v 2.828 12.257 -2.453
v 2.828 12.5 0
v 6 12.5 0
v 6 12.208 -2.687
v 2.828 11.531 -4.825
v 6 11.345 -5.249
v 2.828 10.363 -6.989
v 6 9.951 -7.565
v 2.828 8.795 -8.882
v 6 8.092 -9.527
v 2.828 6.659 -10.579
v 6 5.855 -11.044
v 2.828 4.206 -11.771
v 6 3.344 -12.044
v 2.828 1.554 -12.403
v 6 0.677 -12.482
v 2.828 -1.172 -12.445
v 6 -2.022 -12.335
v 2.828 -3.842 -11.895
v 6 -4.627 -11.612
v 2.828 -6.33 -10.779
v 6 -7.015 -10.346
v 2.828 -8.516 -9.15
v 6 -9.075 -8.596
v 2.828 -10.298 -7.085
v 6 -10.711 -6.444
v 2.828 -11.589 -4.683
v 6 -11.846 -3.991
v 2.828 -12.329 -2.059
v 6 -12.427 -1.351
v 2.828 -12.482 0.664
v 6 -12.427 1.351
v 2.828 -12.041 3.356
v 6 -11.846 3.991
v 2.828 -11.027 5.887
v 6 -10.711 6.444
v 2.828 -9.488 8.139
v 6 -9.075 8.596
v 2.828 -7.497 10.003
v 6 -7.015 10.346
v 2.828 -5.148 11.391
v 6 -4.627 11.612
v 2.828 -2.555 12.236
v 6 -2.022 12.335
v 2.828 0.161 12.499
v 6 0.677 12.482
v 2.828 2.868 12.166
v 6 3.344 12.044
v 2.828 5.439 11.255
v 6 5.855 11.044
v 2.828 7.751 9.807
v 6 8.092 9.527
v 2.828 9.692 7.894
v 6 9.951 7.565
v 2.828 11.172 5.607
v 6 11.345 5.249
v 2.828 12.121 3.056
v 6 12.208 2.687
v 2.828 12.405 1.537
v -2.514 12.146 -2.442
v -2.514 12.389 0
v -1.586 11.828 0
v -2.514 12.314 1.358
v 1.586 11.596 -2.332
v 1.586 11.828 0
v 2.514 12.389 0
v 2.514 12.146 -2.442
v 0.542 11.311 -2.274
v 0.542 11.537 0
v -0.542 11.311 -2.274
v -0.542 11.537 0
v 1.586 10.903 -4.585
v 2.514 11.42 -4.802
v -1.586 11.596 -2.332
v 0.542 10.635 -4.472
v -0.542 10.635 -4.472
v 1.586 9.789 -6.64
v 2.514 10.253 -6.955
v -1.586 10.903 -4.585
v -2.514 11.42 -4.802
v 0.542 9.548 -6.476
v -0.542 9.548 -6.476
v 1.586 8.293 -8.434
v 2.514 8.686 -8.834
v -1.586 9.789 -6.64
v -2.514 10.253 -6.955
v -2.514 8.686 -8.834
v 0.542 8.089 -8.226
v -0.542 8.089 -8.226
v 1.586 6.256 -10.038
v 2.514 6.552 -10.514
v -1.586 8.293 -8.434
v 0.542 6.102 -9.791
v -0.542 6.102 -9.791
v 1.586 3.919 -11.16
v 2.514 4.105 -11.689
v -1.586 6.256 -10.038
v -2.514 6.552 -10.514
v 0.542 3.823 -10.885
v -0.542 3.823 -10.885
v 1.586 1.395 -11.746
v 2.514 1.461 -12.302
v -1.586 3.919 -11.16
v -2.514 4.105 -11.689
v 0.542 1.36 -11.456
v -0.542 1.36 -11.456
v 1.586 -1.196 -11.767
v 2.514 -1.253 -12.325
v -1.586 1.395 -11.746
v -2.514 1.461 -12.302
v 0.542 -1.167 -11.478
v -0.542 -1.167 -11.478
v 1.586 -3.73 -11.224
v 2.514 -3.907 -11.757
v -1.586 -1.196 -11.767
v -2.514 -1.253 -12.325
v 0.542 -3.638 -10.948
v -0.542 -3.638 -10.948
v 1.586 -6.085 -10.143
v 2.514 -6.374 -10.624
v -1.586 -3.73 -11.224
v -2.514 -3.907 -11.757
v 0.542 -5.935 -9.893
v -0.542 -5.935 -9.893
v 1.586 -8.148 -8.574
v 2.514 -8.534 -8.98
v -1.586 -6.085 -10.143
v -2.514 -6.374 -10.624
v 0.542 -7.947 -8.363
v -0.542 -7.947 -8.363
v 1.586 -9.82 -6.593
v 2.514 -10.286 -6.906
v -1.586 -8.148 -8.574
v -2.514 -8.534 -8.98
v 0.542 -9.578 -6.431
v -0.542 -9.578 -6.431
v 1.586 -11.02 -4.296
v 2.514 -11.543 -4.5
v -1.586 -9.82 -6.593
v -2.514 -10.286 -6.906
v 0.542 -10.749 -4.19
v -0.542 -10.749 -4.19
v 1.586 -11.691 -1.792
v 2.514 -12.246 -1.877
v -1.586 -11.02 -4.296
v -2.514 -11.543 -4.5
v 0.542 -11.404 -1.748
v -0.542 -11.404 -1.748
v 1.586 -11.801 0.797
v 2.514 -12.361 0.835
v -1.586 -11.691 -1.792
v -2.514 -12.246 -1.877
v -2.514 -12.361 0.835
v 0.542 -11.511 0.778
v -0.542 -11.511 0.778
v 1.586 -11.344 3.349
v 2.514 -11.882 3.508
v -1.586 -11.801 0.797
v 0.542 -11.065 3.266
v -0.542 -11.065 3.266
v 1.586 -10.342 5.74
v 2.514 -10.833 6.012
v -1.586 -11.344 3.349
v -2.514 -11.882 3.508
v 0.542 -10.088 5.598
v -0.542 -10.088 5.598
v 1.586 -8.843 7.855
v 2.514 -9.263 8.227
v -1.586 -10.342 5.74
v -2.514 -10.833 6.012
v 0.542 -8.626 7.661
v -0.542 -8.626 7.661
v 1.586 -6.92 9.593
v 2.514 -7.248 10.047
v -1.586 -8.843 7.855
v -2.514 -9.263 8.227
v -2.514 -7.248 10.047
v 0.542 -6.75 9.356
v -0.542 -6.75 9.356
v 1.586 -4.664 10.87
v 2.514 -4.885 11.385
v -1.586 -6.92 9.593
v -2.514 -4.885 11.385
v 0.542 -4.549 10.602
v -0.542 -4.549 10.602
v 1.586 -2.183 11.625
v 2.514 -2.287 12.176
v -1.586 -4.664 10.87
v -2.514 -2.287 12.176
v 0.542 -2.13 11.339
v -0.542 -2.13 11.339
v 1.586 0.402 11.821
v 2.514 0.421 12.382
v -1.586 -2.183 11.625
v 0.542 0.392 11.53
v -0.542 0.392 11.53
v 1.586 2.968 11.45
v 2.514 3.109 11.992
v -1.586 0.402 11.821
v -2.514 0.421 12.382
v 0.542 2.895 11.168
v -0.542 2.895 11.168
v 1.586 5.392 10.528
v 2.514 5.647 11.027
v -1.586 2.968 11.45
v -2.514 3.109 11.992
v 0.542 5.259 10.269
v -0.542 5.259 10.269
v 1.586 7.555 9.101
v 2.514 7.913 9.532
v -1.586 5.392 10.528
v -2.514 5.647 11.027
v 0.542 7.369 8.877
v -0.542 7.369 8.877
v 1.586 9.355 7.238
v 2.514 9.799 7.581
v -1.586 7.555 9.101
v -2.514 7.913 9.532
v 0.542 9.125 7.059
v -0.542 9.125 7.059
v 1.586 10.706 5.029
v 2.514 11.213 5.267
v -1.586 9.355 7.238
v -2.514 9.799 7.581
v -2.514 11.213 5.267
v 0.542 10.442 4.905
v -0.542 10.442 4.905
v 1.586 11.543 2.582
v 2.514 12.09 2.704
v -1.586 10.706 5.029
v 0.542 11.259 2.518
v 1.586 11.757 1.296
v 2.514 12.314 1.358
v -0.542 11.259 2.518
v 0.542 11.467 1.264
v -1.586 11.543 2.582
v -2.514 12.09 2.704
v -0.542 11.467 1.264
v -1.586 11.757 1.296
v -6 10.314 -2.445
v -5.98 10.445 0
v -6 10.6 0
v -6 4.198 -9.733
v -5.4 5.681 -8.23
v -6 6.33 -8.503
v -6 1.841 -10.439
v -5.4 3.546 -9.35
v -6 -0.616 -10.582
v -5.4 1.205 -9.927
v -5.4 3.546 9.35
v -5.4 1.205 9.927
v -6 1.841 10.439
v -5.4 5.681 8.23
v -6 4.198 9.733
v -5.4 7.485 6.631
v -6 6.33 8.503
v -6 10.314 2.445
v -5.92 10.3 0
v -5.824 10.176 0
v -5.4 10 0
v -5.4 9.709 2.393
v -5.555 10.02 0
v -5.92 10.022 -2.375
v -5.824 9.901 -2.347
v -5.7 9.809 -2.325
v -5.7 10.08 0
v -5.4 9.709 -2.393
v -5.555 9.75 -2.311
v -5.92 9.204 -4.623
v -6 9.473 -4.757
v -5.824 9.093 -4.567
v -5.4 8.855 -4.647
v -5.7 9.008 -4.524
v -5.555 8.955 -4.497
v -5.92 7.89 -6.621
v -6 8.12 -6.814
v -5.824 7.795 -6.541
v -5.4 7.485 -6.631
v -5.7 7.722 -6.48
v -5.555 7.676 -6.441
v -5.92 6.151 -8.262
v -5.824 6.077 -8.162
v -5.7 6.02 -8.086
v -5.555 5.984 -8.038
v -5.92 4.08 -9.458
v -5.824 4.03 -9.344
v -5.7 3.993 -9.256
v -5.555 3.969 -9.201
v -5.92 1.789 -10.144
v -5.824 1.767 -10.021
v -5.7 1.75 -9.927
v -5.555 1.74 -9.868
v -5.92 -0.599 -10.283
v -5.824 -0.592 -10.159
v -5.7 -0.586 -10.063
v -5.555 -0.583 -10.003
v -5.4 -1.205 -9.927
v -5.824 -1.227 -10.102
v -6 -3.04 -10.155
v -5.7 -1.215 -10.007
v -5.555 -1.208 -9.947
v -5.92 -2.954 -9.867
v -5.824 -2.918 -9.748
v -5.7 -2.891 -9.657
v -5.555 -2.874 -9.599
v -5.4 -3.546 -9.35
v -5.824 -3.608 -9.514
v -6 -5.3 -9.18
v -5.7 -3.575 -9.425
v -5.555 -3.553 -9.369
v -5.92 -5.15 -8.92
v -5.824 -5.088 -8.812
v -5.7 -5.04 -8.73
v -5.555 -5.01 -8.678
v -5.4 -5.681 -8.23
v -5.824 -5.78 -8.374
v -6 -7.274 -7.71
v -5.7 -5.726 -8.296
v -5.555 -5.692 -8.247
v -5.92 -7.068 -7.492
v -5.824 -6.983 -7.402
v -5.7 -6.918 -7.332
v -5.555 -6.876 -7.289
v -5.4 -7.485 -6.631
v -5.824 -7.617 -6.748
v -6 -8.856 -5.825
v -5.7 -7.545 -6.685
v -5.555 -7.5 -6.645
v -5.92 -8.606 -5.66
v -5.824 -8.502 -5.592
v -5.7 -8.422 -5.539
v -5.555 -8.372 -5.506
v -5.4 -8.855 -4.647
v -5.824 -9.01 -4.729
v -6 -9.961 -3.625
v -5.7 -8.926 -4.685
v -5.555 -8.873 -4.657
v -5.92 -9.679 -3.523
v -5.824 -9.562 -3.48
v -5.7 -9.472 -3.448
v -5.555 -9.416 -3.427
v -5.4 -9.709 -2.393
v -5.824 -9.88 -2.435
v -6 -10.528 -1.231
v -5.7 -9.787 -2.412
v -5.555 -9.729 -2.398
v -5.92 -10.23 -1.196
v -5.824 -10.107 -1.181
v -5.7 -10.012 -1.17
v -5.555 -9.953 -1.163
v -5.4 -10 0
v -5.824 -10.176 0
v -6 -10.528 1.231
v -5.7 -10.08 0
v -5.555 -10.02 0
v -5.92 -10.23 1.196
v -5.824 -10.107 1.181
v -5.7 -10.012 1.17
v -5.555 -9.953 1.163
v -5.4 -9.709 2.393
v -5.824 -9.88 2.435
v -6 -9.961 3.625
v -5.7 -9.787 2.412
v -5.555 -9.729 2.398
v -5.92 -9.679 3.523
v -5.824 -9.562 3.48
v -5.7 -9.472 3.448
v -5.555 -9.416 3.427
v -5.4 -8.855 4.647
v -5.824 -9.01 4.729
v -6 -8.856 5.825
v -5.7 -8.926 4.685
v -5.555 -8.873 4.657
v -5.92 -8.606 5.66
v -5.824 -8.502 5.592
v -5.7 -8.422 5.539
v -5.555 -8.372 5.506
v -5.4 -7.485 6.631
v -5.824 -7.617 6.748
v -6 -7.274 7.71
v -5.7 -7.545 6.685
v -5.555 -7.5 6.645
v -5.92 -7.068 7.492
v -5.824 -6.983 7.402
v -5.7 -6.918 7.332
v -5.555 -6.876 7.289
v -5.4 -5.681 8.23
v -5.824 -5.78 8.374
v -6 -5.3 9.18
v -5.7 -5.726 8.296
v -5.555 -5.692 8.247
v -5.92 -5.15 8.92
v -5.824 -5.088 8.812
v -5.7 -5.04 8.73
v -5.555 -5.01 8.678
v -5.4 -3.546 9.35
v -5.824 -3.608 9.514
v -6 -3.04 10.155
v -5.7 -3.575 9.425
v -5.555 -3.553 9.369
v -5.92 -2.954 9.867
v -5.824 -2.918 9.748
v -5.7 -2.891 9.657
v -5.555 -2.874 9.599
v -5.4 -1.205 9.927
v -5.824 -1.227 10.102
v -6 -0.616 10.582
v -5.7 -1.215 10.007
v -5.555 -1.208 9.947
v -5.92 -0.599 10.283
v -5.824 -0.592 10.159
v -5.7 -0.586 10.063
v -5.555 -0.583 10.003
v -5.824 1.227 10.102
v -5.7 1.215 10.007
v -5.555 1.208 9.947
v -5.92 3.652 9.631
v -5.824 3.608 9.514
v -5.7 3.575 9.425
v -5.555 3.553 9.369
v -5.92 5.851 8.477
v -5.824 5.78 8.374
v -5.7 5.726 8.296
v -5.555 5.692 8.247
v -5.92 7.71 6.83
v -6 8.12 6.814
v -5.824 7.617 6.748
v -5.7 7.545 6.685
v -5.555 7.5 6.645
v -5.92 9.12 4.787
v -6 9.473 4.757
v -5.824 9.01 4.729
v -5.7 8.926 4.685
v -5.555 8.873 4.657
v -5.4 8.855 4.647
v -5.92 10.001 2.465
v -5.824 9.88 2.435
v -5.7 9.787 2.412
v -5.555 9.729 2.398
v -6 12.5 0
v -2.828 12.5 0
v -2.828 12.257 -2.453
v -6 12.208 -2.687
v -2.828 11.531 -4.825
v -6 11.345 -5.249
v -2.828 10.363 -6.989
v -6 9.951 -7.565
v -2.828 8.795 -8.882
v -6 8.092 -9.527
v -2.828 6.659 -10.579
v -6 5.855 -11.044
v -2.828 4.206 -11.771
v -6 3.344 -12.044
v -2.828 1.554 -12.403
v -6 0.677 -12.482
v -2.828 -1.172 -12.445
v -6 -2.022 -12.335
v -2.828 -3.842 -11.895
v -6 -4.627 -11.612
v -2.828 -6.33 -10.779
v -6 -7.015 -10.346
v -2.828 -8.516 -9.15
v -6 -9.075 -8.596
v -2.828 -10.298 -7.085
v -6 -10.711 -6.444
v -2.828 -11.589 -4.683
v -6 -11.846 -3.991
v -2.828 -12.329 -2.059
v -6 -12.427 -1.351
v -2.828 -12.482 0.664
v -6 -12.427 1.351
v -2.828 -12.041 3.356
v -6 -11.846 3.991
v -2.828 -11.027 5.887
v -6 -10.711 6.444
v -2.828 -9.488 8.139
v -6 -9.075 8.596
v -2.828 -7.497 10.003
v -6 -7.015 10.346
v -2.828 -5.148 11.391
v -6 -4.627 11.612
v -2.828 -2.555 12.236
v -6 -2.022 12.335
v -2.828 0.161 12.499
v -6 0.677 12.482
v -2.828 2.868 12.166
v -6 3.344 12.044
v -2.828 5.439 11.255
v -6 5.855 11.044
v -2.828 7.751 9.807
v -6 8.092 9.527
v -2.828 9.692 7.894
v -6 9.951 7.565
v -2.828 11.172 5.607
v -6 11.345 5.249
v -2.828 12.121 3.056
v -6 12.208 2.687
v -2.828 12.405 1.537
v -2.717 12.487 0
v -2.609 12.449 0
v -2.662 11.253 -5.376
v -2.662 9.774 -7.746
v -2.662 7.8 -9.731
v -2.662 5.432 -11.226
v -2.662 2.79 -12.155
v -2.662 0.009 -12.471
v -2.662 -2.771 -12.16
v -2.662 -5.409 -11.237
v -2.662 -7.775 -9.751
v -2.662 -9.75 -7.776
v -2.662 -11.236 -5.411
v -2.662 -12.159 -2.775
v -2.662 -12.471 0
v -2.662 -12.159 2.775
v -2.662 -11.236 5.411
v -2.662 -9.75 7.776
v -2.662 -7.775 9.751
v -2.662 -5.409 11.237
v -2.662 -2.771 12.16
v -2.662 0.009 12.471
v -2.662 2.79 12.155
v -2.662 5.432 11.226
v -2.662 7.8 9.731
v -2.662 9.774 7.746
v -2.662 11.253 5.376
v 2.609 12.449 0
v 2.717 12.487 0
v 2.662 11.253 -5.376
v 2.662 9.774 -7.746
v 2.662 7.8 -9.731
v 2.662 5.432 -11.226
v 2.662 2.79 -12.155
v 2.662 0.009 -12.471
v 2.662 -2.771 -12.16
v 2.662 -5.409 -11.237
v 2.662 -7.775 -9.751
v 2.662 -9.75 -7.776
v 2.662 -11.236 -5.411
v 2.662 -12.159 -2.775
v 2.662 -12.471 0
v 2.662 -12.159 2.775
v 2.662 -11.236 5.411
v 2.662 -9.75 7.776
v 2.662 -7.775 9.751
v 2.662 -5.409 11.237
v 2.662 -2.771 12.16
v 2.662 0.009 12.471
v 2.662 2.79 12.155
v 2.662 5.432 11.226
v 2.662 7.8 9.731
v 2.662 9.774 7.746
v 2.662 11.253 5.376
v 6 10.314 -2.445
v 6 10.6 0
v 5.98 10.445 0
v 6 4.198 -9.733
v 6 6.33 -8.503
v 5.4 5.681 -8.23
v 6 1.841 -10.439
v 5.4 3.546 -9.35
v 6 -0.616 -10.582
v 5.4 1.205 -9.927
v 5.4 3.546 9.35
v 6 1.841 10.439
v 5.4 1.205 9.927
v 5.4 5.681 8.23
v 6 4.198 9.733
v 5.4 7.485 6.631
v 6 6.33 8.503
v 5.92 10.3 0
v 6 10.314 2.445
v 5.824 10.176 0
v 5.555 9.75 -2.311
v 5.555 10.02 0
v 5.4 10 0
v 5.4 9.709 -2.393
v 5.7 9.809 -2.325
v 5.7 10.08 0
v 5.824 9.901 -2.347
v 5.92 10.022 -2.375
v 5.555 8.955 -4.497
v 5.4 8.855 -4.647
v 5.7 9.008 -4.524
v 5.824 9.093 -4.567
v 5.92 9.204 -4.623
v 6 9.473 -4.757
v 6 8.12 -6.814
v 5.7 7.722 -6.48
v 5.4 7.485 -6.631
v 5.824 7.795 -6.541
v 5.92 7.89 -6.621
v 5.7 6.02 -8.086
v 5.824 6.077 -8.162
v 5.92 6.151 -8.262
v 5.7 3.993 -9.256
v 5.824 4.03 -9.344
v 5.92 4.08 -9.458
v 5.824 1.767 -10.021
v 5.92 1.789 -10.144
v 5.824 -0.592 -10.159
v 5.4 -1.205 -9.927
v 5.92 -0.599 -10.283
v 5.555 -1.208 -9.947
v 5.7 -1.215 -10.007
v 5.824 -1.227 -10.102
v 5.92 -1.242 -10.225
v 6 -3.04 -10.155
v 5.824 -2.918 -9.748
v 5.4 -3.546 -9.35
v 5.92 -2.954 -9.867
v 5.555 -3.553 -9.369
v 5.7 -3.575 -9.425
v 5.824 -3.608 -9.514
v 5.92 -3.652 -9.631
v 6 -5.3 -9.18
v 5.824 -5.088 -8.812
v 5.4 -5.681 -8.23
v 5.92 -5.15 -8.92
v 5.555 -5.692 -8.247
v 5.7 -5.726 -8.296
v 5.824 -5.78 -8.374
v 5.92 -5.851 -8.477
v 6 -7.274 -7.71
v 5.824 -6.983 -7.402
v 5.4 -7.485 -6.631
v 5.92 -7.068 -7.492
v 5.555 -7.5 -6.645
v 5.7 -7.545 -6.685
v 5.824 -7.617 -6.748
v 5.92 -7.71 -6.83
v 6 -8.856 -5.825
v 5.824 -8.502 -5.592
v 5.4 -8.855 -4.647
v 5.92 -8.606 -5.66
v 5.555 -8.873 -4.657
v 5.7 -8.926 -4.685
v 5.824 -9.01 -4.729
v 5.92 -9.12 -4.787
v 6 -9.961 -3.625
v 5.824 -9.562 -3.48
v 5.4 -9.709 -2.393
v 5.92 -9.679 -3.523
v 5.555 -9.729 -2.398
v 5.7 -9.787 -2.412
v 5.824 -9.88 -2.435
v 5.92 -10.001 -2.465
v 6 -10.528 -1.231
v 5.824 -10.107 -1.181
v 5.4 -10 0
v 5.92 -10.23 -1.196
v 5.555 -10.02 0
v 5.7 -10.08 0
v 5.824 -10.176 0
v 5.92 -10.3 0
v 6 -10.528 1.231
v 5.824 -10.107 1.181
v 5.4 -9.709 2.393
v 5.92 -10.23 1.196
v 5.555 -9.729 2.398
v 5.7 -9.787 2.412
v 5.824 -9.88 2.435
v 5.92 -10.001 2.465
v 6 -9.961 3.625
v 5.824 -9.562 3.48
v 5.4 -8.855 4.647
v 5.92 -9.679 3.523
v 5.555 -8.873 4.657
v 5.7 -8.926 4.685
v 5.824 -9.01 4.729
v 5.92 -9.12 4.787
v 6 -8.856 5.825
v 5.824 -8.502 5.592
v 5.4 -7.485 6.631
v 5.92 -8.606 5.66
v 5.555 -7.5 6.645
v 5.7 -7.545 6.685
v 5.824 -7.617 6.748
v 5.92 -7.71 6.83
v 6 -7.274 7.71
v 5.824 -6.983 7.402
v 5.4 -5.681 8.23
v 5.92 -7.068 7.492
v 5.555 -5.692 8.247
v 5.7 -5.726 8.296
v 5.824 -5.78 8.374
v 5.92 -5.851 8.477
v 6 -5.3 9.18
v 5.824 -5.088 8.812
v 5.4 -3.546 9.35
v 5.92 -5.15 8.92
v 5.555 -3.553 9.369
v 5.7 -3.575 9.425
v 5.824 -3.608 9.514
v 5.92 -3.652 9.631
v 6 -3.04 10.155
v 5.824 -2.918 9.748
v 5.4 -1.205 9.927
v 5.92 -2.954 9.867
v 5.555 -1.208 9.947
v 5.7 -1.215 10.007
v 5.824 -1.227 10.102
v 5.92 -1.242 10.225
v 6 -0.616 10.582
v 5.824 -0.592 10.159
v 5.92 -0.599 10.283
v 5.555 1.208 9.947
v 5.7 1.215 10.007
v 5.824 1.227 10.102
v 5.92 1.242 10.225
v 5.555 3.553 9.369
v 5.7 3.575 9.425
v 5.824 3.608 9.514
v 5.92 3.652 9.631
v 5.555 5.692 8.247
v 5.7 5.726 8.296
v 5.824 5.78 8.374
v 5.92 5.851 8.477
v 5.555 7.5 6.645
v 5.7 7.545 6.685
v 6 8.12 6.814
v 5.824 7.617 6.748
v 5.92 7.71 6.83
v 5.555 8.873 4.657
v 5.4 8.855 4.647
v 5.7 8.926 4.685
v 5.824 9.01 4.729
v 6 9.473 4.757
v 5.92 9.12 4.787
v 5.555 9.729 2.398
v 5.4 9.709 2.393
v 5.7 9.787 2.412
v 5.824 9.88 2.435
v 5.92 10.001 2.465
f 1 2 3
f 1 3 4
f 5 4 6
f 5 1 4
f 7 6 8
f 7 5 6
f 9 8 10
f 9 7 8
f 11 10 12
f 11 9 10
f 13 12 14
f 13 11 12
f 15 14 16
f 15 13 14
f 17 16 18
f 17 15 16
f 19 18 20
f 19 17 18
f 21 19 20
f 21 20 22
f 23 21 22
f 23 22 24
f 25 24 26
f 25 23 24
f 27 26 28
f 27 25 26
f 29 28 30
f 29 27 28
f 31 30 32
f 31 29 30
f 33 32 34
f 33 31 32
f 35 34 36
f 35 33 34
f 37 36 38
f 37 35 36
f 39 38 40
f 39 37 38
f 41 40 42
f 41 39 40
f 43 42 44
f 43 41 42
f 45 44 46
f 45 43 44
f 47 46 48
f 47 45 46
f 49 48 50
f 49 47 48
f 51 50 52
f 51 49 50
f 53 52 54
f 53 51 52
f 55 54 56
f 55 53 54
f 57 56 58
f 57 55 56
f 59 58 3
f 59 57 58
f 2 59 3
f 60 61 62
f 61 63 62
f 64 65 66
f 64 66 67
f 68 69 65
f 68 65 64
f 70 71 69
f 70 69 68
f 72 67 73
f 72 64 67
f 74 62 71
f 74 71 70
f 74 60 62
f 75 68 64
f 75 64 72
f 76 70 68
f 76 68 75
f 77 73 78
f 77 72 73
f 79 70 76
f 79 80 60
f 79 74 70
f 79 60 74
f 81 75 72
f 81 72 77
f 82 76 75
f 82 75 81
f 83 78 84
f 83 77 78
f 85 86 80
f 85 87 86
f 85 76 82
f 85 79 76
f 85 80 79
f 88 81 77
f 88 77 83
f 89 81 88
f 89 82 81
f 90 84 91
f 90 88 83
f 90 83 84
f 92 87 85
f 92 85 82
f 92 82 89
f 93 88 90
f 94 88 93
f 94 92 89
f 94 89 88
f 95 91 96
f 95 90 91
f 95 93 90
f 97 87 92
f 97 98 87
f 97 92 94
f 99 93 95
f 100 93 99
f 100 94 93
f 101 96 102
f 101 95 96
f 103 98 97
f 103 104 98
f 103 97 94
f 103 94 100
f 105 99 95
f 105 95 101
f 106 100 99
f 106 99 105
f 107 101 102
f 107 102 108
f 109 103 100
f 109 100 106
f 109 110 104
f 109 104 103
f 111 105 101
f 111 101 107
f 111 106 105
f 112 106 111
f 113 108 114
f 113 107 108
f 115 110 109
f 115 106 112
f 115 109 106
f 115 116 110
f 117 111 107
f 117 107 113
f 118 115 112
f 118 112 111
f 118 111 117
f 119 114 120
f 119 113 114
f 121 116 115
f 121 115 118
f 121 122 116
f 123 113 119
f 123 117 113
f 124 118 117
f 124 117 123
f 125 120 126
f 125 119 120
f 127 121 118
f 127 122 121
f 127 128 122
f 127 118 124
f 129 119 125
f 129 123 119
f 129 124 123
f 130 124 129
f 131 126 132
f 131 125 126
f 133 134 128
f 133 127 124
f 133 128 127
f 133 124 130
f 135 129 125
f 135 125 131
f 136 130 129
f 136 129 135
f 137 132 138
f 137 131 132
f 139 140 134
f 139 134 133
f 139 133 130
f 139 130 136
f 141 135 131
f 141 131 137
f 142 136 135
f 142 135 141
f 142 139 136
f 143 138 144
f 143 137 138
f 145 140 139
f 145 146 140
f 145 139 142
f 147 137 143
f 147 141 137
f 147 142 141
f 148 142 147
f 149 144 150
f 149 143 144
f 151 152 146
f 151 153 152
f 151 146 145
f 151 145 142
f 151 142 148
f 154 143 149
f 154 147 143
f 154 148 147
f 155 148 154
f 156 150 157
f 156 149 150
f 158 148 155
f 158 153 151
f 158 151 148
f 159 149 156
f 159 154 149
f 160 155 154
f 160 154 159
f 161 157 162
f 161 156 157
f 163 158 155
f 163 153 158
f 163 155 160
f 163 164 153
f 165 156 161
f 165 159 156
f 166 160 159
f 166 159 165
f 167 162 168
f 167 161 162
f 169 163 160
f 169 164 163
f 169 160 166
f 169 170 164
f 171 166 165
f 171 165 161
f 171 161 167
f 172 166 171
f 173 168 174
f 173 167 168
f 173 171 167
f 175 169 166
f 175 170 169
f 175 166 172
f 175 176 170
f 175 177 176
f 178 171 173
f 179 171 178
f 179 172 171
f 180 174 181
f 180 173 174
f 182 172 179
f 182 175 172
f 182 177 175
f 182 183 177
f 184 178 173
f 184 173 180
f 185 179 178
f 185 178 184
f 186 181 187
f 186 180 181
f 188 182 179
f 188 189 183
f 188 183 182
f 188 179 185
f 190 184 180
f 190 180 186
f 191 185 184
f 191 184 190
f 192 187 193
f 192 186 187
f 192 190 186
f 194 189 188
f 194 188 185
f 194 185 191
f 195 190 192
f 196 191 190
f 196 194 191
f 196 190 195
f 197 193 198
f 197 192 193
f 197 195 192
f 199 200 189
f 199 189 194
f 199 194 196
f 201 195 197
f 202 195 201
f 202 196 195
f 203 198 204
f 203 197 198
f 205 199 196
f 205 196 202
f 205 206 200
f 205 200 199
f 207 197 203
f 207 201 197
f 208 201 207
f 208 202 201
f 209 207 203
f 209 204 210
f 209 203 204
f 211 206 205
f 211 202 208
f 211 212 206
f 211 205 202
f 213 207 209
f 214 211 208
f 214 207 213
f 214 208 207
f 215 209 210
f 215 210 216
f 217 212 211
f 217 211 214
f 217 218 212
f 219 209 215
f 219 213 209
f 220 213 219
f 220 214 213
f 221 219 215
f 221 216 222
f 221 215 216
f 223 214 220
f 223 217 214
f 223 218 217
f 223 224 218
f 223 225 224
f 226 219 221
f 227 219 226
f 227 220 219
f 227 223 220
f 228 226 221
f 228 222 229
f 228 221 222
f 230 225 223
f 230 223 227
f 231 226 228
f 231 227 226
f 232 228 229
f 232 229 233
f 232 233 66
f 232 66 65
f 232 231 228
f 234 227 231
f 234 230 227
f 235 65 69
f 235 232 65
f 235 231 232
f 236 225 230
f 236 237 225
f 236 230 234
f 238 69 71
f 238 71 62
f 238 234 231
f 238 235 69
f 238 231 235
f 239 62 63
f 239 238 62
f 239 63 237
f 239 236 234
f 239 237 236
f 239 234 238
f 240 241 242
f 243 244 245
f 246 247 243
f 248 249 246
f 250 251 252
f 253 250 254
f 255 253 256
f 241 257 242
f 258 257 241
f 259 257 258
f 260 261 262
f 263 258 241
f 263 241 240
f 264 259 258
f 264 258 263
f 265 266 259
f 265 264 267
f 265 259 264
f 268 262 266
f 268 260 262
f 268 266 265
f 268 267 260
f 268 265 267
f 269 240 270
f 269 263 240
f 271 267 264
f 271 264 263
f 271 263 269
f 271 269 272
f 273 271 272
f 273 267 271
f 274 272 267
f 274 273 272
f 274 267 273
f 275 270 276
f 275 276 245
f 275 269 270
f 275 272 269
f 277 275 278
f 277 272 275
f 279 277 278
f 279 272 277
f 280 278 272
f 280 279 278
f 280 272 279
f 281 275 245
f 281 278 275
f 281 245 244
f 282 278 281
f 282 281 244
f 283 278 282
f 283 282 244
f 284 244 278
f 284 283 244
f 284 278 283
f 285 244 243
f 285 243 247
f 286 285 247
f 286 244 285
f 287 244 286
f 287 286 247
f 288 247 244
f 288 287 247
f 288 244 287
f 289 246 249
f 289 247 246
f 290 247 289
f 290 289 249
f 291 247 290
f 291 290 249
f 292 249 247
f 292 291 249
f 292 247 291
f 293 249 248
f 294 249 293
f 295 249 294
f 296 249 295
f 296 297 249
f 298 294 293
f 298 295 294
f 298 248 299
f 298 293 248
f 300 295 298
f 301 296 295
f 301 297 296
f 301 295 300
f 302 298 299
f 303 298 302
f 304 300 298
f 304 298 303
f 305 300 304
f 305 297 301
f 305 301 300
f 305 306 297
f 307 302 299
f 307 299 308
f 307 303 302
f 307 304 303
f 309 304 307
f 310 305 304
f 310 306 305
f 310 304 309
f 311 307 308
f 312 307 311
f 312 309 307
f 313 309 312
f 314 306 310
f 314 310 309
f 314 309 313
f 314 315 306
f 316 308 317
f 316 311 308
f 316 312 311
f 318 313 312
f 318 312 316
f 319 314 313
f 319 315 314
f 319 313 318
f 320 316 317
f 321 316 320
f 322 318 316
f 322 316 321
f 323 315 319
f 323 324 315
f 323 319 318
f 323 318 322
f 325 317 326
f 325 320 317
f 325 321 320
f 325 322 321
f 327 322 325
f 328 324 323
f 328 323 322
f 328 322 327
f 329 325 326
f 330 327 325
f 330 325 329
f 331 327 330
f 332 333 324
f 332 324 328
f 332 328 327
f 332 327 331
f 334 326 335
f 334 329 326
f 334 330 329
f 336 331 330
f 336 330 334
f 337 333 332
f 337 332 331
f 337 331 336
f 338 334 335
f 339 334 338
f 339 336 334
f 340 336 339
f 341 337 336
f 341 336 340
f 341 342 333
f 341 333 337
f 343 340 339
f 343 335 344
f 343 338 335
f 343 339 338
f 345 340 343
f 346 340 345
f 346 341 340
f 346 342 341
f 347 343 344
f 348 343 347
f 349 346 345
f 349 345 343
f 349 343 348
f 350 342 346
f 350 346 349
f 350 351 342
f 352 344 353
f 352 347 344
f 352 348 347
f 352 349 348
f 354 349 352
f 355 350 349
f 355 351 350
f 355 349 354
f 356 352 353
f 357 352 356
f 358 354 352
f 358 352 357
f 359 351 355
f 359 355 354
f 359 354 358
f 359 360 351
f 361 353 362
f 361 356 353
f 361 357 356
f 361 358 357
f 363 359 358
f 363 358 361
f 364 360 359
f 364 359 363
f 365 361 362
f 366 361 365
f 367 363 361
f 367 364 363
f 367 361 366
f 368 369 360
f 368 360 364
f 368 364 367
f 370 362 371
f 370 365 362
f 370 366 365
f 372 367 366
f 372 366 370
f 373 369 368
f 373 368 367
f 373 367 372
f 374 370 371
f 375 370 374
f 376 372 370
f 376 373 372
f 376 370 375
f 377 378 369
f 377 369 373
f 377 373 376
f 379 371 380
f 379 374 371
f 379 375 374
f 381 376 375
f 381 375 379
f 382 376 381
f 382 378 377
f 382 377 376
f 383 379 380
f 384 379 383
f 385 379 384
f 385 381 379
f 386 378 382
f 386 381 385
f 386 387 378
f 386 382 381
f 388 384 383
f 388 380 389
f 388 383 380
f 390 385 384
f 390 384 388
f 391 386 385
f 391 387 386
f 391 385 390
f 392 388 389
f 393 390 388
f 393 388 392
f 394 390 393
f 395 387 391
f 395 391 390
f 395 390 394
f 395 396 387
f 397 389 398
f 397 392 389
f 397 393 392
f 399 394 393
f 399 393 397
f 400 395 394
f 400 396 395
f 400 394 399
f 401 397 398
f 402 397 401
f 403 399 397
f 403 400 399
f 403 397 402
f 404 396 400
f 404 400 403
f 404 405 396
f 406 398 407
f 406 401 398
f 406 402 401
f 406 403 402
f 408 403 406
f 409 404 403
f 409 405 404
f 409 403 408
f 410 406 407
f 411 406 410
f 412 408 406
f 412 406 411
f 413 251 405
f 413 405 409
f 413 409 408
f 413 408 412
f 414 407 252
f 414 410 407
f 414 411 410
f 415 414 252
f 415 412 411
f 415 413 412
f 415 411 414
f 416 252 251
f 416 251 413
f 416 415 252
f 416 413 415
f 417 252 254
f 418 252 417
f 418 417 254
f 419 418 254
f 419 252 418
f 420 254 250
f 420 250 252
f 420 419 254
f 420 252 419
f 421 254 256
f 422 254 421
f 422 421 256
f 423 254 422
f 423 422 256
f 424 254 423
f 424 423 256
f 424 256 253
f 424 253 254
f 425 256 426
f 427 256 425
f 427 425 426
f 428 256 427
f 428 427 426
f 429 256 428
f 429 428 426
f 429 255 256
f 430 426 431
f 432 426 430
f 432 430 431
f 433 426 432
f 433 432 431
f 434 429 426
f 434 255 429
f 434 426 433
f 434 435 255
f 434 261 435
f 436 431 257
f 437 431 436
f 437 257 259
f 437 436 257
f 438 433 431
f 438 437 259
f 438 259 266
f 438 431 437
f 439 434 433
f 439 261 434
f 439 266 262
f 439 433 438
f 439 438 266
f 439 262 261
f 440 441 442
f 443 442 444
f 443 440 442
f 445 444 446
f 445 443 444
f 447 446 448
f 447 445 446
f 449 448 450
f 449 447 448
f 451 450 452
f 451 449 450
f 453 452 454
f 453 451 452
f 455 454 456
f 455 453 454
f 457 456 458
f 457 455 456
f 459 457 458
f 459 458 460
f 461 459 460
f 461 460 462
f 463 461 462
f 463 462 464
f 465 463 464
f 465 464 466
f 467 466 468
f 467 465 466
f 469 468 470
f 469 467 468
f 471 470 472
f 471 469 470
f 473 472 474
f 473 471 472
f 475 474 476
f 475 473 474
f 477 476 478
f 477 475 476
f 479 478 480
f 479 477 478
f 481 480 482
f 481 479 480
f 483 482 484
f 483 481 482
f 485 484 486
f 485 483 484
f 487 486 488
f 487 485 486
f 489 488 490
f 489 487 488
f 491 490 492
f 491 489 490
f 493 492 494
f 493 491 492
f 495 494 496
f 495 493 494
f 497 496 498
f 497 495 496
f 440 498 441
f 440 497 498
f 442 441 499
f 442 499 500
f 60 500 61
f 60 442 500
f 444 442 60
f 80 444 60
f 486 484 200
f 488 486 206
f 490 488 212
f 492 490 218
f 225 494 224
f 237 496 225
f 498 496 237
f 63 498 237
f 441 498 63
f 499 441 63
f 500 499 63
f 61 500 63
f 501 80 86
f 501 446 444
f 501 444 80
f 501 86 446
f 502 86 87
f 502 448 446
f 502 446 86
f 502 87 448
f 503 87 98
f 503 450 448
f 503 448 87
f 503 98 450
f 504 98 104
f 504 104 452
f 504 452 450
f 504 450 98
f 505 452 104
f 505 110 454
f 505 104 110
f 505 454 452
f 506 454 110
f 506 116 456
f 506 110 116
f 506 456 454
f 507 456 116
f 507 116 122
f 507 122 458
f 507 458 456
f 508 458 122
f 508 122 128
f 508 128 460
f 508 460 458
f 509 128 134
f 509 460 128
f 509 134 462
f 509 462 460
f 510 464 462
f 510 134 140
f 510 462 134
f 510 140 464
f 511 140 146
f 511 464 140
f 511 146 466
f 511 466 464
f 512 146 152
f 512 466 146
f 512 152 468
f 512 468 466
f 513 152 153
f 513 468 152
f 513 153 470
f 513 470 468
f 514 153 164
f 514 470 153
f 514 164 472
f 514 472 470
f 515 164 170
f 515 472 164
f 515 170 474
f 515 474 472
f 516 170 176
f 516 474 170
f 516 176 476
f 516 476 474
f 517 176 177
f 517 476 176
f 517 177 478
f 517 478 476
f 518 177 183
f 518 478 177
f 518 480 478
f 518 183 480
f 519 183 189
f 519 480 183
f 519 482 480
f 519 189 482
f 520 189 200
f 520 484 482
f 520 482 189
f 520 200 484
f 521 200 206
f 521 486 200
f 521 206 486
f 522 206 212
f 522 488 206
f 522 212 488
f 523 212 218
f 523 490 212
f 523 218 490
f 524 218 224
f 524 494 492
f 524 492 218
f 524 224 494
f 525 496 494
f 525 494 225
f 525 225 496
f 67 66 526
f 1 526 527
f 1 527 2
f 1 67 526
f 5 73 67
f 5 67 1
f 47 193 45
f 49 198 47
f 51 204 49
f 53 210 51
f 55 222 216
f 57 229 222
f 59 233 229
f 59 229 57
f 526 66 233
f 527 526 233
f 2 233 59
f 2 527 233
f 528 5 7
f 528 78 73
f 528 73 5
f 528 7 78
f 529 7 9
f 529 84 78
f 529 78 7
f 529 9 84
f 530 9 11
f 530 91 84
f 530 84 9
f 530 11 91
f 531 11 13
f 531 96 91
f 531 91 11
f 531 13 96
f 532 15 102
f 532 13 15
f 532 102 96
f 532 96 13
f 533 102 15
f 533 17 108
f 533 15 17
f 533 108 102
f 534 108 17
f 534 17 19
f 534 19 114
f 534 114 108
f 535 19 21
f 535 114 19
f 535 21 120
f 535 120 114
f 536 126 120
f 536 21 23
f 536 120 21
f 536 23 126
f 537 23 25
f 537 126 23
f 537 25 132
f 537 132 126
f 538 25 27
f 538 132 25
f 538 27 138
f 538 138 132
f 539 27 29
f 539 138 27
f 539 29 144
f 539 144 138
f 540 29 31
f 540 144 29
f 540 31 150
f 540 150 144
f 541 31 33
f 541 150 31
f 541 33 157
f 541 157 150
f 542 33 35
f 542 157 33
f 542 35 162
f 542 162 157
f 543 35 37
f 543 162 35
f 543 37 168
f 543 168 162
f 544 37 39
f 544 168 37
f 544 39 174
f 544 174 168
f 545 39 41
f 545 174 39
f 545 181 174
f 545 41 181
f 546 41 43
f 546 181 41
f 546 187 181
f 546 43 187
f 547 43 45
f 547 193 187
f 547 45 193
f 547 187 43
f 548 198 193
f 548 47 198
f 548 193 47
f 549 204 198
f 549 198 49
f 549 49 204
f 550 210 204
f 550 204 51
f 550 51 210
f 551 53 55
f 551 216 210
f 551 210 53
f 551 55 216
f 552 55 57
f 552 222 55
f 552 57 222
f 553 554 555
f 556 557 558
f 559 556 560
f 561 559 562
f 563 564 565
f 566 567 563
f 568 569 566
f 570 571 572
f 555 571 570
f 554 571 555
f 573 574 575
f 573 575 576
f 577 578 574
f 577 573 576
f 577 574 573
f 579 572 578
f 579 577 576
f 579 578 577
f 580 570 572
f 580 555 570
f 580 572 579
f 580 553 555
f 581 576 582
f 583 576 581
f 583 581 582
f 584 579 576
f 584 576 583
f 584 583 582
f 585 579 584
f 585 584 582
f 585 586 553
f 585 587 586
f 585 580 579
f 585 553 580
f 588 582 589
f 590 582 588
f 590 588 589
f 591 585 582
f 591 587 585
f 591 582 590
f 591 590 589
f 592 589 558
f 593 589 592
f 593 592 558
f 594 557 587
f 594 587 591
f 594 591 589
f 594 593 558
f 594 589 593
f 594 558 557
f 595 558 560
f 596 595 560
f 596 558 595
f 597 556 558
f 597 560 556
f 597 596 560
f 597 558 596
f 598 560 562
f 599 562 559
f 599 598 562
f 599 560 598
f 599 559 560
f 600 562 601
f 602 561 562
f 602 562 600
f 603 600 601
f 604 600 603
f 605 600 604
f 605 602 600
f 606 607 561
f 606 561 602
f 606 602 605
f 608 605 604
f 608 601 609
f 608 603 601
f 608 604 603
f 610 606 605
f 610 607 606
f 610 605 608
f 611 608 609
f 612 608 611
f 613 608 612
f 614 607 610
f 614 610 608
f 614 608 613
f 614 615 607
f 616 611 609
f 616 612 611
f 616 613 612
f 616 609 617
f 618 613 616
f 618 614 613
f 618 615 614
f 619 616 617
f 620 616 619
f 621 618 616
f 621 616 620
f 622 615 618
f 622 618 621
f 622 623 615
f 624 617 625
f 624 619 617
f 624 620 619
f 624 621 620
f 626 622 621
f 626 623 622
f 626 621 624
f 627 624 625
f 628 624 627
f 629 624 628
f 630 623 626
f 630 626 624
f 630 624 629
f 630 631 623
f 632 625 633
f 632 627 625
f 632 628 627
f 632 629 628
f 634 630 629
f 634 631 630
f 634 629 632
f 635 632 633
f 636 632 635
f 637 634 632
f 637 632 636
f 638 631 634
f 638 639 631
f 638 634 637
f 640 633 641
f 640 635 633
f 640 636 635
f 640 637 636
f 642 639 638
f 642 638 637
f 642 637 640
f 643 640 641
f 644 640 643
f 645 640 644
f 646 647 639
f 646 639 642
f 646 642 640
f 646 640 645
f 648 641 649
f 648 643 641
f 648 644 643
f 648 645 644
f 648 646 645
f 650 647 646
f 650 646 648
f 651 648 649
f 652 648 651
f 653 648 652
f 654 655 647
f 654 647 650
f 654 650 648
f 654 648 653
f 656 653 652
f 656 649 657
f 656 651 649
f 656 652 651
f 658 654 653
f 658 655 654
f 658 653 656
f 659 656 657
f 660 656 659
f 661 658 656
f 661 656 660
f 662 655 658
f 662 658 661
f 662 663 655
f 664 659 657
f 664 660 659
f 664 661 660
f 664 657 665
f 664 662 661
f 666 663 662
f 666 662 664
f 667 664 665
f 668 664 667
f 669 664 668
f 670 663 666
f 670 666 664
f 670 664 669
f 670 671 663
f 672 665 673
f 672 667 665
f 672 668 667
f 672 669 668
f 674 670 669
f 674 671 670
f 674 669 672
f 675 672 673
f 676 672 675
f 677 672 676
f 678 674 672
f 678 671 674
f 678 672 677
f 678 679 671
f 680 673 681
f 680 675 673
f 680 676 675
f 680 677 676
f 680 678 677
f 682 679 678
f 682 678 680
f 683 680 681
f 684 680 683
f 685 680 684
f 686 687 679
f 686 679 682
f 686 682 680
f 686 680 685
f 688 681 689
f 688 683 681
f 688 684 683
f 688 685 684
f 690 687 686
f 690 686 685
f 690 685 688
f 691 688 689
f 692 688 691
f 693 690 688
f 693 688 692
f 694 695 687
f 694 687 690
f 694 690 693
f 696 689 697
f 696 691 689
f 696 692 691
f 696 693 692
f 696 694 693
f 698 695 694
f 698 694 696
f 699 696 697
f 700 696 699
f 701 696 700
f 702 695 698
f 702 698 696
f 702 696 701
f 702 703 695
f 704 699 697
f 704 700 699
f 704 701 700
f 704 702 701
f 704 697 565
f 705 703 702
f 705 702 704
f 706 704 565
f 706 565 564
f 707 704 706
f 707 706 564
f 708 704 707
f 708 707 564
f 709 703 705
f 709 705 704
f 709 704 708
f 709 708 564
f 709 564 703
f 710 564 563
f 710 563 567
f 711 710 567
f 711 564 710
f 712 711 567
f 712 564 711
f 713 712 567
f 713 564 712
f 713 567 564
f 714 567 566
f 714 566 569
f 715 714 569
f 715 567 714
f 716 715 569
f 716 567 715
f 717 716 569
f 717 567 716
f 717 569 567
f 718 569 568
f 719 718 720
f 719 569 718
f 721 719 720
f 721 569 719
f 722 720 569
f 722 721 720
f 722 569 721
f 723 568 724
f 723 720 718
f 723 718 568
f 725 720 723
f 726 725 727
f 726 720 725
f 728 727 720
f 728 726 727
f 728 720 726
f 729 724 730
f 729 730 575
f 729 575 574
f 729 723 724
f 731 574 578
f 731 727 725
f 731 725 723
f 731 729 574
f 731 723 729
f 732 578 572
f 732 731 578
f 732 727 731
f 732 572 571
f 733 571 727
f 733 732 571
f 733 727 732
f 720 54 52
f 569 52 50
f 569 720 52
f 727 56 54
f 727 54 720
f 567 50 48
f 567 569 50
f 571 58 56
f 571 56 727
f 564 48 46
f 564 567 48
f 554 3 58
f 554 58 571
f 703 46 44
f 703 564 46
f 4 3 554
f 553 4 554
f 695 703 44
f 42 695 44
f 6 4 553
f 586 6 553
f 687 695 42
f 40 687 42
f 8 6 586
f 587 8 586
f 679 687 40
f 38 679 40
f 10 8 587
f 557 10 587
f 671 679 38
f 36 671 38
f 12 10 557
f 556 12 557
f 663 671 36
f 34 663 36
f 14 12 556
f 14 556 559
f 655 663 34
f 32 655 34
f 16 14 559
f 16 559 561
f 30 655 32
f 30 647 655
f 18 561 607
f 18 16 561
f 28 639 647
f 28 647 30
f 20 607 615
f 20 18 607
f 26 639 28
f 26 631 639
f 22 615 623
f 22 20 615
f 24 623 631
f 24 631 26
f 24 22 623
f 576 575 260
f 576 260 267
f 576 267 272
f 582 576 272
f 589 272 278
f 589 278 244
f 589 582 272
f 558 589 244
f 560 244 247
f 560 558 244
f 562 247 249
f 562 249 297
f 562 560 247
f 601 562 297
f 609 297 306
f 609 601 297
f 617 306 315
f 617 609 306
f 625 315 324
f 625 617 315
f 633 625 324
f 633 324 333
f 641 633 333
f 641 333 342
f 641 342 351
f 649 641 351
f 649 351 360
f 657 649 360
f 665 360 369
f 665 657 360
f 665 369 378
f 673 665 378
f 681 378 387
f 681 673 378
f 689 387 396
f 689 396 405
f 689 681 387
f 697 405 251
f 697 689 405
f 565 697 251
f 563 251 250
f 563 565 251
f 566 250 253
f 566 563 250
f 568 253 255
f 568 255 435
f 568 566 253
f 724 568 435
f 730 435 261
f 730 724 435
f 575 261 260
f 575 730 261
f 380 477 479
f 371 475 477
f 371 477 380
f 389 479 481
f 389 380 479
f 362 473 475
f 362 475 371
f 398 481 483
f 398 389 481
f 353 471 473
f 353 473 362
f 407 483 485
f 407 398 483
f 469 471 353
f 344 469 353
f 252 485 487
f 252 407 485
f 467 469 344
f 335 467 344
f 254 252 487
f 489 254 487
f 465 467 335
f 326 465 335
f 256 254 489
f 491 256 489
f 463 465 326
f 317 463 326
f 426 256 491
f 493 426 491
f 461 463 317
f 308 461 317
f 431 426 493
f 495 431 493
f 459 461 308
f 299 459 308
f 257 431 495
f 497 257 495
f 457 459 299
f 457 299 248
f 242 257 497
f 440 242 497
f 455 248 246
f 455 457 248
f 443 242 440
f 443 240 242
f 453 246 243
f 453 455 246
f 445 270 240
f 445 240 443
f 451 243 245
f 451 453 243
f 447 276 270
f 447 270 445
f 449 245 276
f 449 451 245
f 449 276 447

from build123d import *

# Parameters (mm, degrees)
FILLET1_R = 0.6
FILLET2_R = 0.5


with BuildPart() as part:
    # Sketch1 → Revolve1 (revolve)
    with BuildSketch(Plane.XY):
        with BuildLine():
            Line((-6, 12.5), (-6, 10))
            Line((-6, 10), (6, 10))
            Line((6, 10), (6, 12.5))
            Line((6, 12.5), (2.645751311, 12.5))
            ThreePointArc((2.645751311, 12.5), (0, 11.5), (-2.645751311, 12.5))
            Line((-2.645751311, 12.5), (-6, 12.5))
        make_face()
    revolve(axis=Axis((44.126443973, 0, 0), (-1, 0, 0)))

    # Fillet1
    fillet1_edges = [part.edges().sort_by_distance(p)[0] for p in [
        (6, -10, 0),
        (-6, -10, 0),
    ]]
    fillet(fillet1_edges, radius=FILLET1_R)

    # Fillet2
    fillet2_edges = [part.edges().sort_by_distance(p)[0] for p in [
        (2.645751311, -12.5, 0),
        (-2.645751311, -12.5, 0),
    ]]
    fillet(fillet2_edges, radius=FILLET2_R)


solid = part.part
